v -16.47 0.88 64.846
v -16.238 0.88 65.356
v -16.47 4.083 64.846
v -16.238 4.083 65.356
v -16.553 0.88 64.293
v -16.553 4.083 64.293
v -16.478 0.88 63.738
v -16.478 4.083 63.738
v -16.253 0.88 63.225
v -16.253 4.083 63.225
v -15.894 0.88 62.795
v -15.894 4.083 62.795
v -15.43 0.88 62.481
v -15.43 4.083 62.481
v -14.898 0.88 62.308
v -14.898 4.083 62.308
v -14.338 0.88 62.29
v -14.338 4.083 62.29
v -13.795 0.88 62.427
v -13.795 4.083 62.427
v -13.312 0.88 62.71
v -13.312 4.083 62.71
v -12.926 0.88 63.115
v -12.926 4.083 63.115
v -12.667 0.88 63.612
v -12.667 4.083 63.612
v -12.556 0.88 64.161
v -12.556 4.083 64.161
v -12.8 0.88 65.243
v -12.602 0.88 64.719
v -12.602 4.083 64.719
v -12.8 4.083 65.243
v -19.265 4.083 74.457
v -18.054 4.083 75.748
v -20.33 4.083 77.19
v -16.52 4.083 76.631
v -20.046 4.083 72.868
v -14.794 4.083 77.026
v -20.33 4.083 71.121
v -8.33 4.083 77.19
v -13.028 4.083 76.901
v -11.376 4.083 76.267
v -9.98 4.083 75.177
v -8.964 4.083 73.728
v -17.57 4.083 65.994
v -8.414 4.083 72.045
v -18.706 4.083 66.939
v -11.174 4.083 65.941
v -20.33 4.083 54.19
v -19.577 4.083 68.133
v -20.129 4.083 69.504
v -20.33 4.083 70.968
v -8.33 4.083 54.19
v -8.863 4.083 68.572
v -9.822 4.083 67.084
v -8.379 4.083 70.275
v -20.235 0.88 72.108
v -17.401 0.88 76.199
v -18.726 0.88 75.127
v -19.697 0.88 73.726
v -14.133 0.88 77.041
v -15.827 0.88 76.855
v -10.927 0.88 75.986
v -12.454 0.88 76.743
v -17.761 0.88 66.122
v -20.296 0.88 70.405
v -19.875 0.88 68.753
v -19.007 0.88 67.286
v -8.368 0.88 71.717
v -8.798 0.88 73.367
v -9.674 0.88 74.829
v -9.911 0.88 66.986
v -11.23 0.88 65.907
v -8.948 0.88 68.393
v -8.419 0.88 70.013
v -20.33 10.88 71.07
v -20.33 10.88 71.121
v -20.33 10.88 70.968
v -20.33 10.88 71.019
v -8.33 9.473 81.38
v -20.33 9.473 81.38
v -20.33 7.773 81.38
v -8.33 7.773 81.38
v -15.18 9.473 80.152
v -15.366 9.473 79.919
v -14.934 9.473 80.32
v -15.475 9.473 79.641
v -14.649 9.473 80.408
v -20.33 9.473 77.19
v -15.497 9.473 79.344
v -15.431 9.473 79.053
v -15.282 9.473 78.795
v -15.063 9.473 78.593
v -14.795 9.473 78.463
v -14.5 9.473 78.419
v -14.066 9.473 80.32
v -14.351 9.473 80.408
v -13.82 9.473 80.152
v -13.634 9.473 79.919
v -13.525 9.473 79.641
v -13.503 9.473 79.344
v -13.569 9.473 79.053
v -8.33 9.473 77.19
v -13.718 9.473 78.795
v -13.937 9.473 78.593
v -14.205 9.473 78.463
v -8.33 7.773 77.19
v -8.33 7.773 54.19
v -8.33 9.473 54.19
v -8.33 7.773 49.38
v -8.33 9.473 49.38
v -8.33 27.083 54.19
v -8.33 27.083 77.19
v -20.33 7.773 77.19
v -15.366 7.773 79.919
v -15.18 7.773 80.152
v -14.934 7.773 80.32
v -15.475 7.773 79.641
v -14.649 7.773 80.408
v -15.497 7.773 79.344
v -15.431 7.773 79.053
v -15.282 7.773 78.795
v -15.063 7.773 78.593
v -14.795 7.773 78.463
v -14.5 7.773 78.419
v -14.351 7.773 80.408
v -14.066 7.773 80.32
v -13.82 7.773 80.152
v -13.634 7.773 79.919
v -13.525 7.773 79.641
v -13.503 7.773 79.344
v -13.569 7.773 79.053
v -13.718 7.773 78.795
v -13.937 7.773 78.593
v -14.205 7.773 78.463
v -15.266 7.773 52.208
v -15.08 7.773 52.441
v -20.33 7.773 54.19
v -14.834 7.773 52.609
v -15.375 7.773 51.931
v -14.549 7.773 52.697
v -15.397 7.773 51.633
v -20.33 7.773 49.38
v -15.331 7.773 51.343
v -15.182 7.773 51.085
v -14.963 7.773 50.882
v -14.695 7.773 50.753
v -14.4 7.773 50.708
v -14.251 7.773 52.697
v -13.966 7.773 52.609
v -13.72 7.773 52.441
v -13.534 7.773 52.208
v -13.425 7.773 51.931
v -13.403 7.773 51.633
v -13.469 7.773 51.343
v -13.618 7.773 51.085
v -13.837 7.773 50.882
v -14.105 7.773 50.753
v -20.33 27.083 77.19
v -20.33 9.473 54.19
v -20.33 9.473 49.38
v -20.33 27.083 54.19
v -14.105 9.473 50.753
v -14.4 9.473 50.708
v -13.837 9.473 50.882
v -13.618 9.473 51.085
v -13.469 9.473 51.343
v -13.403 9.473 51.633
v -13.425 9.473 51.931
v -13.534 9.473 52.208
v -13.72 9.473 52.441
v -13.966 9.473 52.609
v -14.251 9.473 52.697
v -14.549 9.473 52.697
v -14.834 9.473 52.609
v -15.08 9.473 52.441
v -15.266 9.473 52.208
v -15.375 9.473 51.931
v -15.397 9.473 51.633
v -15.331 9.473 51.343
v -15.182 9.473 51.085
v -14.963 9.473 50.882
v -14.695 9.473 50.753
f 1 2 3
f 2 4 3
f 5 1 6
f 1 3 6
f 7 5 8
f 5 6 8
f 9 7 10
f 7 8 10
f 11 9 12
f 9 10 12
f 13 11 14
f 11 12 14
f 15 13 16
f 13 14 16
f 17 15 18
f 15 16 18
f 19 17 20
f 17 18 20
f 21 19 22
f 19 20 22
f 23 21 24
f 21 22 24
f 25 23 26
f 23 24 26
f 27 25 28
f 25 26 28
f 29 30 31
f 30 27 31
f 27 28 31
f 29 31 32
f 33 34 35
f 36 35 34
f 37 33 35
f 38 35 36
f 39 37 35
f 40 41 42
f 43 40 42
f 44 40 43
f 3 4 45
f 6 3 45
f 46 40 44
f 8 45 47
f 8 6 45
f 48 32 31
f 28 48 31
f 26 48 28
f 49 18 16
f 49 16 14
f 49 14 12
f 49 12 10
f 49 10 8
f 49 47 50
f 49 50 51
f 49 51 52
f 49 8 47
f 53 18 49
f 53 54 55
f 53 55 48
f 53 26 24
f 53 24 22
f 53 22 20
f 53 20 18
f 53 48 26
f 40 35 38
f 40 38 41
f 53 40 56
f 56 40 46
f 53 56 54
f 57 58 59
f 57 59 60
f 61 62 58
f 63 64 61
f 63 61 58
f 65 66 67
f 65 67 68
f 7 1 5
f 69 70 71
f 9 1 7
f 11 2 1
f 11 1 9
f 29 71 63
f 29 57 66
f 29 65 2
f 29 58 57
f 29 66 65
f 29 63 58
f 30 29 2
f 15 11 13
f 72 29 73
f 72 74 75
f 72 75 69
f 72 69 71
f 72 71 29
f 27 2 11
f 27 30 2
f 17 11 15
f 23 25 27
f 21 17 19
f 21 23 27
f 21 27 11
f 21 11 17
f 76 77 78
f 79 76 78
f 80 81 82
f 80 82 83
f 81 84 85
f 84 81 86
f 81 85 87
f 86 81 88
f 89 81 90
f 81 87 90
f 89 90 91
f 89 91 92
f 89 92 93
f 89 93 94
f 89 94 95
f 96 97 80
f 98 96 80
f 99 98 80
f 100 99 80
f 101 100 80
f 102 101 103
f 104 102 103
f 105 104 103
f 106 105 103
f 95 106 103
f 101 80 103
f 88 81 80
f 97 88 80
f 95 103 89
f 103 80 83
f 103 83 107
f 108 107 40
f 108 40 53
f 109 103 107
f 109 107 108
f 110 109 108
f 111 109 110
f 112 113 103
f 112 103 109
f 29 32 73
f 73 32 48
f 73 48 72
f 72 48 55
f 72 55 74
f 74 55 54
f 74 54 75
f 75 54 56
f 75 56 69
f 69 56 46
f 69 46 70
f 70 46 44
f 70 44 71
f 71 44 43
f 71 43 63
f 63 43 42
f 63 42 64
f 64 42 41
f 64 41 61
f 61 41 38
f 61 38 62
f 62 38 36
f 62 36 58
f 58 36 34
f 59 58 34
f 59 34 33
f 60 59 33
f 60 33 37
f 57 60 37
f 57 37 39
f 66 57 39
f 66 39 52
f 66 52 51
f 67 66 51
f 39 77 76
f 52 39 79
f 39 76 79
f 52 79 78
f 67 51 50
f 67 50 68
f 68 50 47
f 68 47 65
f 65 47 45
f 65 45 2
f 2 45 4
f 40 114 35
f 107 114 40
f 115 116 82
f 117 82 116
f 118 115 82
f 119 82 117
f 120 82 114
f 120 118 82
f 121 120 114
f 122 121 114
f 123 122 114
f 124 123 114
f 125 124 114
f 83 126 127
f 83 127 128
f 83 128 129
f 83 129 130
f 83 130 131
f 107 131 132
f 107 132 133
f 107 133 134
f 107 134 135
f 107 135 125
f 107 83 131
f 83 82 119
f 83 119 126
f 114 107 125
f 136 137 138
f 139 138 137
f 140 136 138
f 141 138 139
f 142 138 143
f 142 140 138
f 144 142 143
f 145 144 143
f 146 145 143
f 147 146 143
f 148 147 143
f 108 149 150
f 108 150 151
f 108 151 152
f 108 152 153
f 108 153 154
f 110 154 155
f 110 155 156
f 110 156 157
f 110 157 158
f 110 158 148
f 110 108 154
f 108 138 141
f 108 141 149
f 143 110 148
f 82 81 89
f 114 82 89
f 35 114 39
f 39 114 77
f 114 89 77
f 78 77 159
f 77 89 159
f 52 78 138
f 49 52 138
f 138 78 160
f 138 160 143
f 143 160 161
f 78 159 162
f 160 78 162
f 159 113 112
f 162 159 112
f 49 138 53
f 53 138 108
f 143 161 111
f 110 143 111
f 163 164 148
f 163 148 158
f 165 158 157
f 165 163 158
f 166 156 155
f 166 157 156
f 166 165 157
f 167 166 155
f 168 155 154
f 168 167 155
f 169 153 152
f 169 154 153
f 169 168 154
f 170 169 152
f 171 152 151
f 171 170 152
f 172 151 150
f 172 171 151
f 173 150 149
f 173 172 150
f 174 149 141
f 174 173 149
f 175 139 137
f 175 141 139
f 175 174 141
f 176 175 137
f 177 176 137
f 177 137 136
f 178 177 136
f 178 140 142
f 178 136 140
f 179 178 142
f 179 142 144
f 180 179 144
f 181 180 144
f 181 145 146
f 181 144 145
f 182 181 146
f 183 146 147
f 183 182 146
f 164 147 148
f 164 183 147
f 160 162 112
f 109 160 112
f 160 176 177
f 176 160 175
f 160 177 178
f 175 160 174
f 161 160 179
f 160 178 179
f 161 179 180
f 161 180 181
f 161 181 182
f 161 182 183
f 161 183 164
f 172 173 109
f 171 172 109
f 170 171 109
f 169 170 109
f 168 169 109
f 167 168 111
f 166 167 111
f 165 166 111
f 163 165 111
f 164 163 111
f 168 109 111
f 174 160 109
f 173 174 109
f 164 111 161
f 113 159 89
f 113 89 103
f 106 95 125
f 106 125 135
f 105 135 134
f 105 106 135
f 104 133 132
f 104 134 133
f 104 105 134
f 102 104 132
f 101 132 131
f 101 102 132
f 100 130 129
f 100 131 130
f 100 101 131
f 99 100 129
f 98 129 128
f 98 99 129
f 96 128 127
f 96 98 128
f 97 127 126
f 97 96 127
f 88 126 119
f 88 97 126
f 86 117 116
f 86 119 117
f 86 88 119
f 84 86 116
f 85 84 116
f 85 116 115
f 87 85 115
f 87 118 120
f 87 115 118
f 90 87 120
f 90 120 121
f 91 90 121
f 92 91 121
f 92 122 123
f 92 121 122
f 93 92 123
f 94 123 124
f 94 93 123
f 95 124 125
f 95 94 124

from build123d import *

# Parameters (mm, degrees)
CYLINDER036_R             = 6
CYLINDER036_DEPTH         = 10
CYLINDER032_R             = 1
CYLINDER032_DEPTH         = 10
CYLINDER034_R             = 1
CYLINDER034_DEPTH         = 10
BOX003_W                  = 23
BOX003_H                  = 12
BOX003_DEPTH              = 23
BOX004_W                  = 32
BOX004_H                  = 12
BOX004_DEPTH              = 1.7
CYLINDER035_R             = 2
CYLINDER035_DEPTH         = 10
FUSION005_PITCH_ANGLE     = 90
FUSION005_PLACEMENT_ANGLE = -90


with BuildPart() as cylinder036:
    # Cylinder036 → Cylinder036 (new body)
    with BuildSketch(Plane(origin=(34.4857, 34.67, 6.56), x_dir=(1, 0, 0), z_dir=(0, 0, 1))):
        Circle(CYLINDER036_R)
    extrude(amount=CYLINDER036_DEPTH)


with BuildPart() as cylinder032:
    # Cylinder032 → Cylinder032 (new body)
    with BuildSketch(Plane(origin=(53.8219, 34.6, 2.58368), x_dir=(1, 0, 0), z_dir=(0, 0, 1))):
        Circle(CYLINDER032_R)
    extrude(amount=CYLINDER032_DEPTH)


with BuildPart() as cylinder034:
    # Cylinder034 → Cylinder034 (new body)
    with BuildSketch(Plane(origin=(26.1112, 34.5, 1.79316), x_dir=(1, 0, 0), z_dir=(0, 0, 1))):
        Circle(CYLINDER034_R)
    extrude(amount=CYLINDER034_DEPTH)


with BuildPart() as box003:
    # Box003 → Box003 (new body)
    with BuildSketch(Plane(origin=(28.340083, 28.670488, -9.643048), x_dir=(1, 0, 0), z_dir=(0, 0, 1))):
        with Locations((11.5, 6)):
            Rectangle(BOX003_W, BOX003_H)
    extrude(amount=BOX003_DEPTH)


with BuildPart() as cut039:
    # Box004 → Box004 (new body)
    with BuildSketch(Plane(origin=(24.149959, 28.670488, 7.966797), x_dir=(1, 0, 0), z_dir=(0, 0, 1))):
        with Locations((16, 6)):
            Rectangle(BOX004_W, BOX004_H)
    extrude(amount=BOX004_DEPTH)

    # Fusion003: union Box003
    add(box003.part)

    # Cut038: cut Cylinder034
    add(cylinder034.part, mode=Mode.SUBTRACT)

    # Cut039: cut Cylinder032
    add(cylinder032.part, mode=Mode.SUBTRACT)


with BuildPart() as fusion005:
    # Cylinder035 → Cylinder035 (new body)
    with BuildSketch(Plane(origin=(41.2515, 34.4472, 6.56), x_dir=(1, 0, 0), z_dir=(0, 0, 1))):
        Circle(CYLINDER035_R)
    extrude(amount=CYLINDER035_DEPTH)

    # Fusion005: union Cylinder036, Cut039
    add(cylinder036.part)
    add(cut039.part)


with BuildPart() as fusion005_1:
    # Fusion005 pitch: moved
    add(fusion005.part.rotate(Axis((0, 0, 0), (0, 1, 0)), FUSION005_PITCH_ANGLE))


with BuildPart() as fusion005_2:
    # Fusion005 placement: moved
    add(fusion005_1.part.moved(Location((-49, 17.44, 105.53))).rotate(Axis((-49, 17.44, 105.53), (0, 0, 1)), FUSION005_PLACEMENT_ANGLE))


solid = fusion005_2.part
